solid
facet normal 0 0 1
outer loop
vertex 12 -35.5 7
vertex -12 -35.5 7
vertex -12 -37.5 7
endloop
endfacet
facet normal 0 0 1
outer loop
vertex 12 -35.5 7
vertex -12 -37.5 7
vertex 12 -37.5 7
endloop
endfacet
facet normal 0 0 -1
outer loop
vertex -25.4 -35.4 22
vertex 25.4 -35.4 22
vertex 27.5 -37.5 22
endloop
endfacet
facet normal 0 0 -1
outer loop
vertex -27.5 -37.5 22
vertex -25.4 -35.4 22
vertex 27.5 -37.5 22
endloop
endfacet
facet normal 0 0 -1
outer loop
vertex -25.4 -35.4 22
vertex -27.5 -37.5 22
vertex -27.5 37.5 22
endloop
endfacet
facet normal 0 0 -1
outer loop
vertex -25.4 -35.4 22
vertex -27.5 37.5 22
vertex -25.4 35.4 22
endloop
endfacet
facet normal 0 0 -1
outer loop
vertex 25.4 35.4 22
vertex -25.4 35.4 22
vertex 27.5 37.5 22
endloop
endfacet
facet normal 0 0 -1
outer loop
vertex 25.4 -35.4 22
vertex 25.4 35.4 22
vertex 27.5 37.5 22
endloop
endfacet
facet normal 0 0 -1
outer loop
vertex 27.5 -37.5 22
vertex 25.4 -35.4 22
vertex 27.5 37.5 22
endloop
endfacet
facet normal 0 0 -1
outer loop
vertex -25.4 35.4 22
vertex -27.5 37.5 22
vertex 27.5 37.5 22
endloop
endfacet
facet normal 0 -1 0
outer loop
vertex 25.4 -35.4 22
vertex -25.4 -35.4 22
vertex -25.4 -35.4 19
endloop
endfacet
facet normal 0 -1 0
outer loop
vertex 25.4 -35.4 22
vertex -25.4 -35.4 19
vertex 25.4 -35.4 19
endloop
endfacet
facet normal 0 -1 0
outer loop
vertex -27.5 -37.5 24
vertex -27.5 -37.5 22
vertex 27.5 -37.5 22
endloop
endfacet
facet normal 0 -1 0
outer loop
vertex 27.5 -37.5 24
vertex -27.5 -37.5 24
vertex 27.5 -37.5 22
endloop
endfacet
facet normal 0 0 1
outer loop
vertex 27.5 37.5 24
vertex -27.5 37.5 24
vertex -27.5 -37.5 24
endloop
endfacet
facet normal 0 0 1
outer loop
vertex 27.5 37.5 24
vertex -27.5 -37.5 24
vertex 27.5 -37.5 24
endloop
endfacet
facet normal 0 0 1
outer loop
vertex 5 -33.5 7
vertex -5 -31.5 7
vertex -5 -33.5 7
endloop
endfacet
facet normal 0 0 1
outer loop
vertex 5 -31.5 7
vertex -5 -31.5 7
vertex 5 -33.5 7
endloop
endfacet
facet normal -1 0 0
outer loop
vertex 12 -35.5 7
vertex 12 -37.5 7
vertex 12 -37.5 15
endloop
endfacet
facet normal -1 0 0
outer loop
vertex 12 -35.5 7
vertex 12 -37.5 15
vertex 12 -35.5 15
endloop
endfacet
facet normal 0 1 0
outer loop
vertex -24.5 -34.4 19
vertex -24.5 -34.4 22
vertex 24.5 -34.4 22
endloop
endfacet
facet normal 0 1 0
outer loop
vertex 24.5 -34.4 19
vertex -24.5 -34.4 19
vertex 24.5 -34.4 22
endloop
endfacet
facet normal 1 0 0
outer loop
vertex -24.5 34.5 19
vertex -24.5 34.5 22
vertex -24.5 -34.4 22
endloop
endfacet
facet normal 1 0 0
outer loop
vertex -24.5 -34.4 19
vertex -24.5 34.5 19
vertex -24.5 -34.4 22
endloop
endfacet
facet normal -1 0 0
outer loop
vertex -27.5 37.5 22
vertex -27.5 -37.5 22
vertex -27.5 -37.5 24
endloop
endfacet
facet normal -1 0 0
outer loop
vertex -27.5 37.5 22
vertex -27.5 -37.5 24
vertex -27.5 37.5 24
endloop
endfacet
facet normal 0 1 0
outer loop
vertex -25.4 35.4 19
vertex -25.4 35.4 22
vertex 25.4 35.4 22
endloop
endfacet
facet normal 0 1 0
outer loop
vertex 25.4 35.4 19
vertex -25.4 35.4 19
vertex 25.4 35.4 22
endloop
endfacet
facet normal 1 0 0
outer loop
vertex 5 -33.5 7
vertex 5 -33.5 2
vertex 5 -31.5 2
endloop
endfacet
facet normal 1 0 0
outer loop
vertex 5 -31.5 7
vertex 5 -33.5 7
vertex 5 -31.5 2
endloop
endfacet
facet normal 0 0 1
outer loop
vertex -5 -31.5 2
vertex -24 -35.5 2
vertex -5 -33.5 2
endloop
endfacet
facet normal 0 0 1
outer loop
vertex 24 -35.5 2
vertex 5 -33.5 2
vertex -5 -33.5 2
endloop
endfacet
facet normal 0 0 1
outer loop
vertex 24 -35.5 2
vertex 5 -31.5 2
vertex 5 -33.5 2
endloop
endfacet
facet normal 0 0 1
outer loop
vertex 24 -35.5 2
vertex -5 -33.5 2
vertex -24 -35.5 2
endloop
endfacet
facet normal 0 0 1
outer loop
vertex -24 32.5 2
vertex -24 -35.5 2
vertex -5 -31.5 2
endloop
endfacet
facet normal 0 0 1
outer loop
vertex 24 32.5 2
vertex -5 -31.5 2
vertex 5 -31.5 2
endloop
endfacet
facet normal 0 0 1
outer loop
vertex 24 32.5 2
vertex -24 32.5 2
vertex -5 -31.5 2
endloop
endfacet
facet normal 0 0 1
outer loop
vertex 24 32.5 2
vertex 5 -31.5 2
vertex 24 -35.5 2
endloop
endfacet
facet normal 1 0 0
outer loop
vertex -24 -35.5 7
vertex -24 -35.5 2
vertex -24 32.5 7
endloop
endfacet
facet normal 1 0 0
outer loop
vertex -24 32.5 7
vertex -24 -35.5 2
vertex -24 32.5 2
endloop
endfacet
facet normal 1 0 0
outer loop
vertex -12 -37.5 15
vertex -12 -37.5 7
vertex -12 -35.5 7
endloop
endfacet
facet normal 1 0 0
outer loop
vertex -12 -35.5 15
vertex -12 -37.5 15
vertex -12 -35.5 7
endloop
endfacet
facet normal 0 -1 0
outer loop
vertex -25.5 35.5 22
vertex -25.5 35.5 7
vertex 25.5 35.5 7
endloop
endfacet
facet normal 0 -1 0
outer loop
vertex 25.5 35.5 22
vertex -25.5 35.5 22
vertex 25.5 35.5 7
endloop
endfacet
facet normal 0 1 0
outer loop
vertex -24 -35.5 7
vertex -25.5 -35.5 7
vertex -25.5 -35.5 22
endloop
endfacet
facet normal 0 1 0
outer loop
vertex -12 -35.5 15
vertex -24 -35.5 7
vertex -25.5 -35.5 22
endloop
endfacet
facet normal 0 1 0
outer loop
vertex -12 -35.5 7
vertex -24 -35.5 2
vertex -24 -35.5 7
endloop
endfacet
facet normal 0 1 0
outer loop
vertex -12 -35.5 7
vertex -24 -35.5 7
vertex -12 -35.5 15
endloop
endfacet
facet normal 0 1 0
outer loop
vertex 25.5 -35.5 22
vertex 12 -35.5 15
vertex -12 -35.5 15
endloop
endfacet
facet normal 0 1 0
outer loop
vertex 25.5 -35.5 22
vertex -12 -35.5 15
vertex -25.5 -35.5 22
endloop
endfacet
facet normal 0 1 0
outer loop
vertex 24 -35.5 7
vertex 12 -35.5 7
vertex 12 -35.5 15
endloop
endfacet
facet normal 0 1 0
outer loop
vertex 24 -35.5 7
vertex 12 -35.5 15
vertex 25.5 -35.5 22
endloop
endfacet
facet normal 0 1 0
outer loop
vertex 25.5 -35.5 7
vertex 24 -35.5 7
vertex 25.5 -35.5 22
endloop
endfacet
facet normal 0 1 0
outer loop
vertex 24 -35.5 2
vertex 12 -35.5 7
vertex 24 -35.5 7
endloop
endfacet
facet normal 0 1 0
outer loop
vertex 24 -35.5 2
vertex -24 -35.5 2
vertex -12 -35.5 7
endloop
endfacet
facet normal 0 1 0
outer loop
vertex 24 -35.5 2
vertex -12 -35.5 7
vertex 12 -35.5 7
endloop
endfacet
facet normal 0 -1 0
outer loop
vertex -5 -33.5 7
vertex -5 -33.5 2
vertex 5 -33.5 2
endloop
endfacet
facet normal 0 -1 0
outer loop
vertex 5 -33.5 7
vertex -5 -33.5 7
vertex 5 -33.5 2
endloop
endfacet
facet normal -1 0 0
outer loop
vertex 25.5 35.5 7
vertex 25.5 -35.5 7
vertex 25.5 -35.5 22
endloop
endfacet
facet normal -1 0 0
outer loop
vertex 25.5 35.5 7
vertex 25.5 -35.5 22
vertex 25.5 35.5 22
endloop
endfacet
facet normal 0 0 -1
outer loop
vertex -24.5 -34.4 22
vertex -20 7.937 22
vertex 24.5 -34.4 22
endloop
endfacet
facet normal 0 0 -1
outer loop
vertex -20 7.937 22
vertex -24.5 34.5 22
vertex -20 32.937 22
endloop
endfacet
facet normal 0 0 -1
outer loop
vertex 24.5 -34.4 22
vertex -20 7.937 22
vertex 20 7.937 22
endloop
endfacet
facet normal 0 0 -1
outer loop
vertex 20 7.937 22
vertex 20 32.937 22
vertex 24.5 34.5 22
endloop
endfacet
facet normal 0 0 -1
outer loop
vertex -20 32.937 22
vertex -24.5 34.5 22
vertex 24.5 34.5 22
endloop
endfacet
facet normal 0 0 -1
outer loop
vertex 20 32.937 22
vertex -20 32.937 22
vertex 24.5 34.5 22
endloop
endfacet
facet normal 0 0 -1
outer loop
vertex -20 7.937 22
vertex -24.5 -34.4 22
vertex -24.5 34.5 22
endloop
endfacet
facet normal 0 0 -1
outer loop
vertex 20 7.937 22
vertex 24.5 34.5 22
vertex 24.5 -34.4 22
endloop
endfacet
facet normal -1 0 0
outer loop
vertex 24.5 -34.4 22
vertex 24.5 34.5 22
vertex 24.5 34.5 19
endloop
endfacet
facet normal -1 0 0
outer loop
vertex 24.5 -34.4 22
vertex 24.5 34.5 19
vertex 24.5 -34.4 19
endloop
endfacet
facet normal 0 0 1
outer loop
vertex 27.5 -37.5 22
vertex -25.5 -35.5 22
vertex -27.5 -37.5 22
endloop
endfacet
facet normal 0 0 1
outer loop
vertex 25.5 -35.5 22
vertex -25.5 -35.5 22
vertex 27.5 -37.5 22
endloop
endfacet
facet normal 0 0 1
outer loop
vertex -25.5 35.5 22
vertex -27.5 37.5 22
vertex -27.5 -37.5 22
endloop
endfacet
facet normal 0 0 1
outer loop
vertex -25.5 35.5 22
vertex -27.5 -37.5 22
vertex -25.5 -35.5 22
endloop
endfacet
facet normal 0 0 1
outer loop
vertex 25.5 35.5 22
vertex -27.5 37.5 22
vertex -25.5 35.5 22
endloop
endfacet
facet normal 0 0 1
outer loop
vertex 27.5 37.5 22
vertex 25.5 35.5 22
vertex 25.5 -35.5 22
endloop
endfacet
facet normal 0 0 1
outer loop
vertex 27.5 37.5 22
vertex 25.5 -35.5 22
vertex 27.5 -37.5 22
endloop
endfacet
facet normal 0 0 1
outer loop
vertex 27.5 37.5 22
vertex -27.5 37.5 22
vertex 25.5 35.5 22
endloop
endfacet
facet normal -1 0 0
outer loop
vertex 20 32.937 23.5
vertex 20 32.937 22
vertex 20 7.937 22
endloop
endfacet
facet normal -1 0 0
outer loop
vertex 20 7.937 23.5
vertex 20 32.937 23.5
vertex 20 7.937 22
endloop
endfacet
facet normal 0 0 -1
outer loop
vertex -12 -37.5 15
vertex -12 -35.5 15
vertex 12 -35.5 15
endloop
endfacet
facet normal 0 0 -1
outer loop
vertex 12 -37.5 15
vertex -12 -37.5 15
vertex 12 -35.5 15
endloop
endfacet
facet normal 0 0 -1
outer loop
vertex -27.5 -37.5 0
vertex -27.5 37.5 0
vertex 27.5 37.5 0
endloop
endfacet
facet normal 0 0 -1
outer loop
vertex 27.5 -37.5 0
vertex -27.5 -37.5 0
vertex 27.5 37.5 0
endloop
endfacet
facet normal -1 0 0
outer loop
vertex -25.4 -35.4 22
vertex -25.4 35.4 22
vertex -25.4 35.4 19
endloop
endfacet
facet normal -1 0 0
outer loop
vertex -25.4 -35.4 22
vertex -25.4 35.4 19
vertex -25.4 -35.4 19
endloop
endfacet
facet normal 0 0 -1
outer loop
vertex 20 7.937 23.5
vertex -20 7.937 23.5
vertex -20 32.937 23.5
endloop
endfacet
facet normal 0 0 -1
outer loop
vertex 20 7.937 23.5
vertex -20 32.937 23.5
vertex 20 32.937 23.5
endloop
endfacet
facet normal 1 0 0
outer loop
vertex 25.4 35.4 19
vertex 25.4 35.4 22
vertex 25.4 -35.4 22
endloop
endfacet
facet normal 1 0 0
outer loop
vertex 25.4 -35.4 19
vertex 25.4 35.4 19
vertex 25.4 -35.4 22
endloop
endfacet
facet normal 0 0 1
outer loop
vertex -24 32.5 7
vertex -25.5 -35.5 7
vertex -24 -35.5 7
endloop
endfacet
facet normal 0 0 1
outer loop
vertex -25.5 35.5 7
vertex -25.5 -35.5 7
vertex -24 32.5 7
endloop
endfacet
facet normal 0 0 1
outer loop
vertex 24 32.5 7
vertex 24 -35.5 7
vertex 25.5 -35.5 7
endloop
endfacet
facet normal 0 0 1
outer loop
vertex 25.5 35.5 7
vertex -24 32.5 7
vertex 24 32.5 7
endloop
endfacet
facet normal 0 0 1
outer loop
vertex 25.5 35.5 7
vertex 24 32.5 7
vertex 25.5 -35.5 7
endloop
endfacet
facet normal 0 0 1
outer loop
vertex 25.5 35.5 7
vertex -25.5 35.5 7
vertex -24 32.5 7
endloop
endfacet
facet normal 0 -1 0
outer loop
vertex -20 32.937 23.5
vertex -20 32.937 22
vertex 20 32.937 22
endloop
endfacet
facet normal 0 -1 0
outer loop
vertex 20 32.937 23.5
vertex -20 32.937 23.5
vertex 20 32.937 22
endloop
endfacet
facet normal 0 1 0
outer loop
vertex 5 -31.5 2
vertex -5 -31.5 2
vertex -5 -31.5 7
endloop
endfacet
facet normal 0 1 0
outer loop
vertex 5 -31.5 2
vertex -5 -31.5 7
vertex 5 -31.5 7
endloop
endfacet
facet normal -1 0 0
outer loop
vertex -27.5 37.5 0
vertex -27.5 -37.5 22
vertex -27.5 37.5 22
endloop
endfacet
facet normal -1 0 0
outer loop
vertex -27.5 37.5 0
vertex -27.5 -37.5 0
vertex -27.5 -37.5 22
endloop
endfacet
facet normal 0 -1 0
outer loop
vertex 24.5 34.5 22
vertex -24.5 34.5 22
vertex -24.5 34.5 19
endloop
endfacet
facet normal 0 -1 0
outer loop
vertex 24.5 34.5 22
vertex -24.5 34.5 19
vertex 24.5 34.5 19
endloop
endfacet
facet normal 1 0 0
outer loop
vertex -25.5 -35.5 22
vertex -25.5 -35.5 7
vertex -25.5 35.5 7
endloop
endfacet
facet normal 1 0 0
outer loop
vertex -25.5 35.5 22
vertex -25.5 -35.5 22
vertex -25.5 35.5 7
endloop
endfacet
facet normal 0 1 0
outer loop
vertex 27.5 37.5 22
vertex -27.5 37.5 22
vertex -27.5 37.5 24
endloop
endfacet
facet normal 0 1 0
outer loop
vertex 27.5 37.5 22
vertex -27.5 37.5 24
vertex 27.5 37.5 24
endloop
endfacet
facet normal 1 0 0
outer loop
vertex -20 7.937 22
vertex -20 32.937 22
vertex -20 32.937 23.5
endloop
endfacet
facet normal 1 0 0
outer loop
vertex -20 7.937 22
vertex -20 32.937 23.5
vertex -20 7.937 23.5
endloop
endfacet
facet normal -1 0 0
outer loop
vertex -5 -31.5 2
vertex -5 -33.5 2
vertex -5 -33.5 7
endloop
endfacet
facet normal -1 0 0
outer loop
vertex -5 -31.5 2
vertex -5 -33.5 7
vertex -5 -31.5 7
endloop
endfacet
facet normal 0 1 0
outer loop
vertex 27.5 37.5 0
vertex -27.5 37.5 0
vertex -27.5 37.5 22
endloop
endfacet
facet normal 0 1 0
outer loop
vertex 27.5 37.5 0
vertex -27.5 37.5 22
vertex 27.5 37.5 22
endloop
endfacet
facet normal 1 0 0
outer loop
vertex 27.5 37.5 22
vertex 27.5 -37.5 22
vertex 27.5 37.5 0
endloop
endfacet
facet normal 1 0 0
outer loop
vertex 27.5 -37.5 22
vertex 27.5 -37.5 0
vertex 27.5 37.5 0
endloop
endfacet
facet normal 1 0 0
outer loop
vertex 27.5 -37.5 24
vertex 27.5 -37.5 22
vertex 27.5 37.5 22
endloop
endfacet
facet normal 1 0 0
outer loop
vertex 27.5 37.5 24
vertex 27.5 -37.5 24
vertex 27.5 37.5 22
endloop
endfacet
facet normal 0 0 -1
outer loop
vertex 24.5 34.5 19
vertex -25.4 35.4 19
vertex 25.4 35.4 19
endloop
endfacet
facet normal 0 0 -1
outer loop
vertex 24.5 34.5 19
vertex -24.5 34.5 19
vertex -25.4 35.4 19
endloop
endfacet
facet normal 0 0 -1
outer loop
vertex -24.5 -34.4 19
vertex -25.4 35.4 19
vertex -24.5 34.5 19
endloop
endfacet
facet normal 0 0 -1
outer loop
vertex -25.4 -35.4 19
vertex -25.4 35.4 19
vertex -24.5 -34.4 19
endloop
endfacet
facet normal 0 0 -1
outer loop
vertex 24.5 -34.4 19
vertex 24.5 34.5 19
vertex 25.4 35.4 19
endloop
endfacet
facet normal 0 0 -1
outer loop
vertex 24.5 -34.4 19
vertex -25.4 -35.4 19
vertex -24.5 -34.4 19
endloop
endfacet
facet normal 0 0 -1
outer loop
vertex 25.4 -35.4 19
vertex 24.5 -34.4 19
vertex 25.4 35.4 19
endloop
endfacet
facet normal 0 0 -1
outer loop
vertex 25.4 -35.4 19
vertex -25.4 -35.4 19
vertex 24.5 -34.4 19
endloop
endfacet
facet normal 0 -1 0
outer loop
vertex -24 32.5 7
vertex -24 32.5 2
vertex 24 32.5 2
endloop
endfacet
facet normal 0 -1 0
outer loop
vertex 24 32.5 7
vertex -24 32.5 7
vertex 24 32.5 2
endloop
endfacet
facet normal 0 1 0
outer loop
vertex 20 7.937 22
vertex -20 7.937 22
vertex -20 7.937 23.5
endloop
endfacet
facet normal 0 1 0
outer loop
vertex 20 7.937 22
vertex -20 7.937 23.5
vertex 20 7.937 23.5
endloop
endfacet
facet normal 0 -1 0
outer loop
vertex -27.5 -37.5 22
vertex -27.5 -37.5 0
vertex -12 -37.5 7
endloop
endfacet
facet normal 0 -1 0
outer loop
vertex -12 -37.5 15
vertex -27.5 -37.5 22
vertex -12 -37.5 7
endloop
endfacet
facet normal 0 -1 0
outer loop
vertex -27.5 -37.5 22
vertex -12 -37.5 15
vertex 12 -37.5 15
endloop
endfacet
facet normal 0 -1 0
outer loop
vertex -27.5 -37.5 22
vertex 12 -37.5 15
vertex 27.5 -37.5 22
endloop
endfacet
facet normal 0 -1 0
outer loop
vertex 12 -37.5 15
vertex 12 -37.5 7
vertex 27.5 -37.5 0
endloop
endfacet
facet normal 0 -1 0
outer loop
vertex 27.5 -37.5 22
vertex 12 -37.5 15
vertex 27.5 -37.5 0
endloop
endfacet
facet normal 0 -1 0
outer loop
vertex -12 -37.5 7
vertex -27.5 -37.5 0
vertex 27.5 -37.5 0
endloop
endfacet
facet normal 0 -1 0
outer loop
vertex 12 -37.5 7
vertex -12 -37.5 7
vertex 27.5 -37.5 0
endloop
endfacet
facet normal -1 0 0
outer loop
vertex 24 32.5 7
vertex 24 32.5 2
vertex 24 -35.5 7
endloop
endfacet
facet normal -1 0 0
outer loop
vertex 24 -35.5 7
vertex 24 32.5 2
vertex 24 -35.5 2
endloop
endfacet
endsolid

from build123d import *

# Parameters (mm, degrees)
F0_W      = 55
F0_H      = 75
F1_DEPTH  = 2
F2_W      = 55
F2_H      = 75
F2_W_2    = 51
F2_H_2    = 71
F3_DEPTH  = 20
F4_W      = 10
F4_H      = 2
F5_DEPTH  = 5
F6_W      = 24
F6_H      = 20.3130708972
F7_DEPTH  = 8
F8_W      = 55
F8_H      = 75
F9_DEPTH  = 2
F10_W     = 50.8
F10_H     = 70.8
F10_W_2   = 49
F10_H_2   = 68.9
F11_DEPTH = 3
F12_W     = 40
F12_H     = 25
F13_DEPTH = 1.5


with BuildPart() as f1:
    # F0 (on Top) → F1 (new body)
    with BuildSketch(Plane.XY):
        Rectangle(F0_W, F0_H)
    extrude(amount=F1_DEPTH)

    # F2 (on face) → F3 (join)
    with BuildSketch(Plane.XY.offset(2)):
        Rectangle(F2_W, F2_H)
        Rectangle(F2_W_2, F2_H_2, mode=Mode.SUBTRACT)
    extrude(amount=F3_DEPTH)

    # F4 (on face) → F5 (join)
    with BuildSketch(Plane.XY.offset(2)):
        Polygon((-25.5, 35.5), (-25.5, -35.5), (-24, -35.5), (-24, 32.5), (24, 32.5), (24, -35.5), (25.5, -35.5), (25.5, 35.5), align=None)
        with Locations((0, -32.5)):
            Rectangle(F4_W, F4_H)
    extrude(amount=F5_DEPTH)

    # F6 (on face) → F7 (cut)
    with BuildSketch(Plane.XY.offset(7)):
        with Locations((0, -33.1037100405)):
            Rectangle(F6_W, F6_H)
    extrude(amount=F7_DEPTH, mode=Mode.SUBTRACT)


with BuildPart() as f9:
    # F8 (on face) → F9 (new body)
    with BuildSketch(Plane.XY.offset(22)):
        Rectangle(F8_W, F8_H)
    extrude(amount=F9_DEPTH)

    # F10 (on face) → F11 (join)
    with BuildSketch(Plane(origin=(0, 0, 22), x_dir=(1, 0, 0), z_dir=(0, 0, -1))):
        Rectangle(F10_W, F10_H)
        with Locations((0, -0.05)):
            Rectangle(F10_W_2, F10_H_2, mode=Mode.SUBTRACT)
    extrude(amount=F11_DEPTH)

    # F12 (on face) → F13 (cut, through all)
    with BuildSketch(Plane(origin=(0, 0, 22), x_dir=(1, 0, 0), z_dir=(0, 0, -1))):
        with Locations((0, -20.4369307555)):
            Rectangle(F12_W, F12_H)
    extrude(amount=-F13_DEPTH, mode=Mode.SUBTRACT)


solid = Compound([f1.part, f9.part])
